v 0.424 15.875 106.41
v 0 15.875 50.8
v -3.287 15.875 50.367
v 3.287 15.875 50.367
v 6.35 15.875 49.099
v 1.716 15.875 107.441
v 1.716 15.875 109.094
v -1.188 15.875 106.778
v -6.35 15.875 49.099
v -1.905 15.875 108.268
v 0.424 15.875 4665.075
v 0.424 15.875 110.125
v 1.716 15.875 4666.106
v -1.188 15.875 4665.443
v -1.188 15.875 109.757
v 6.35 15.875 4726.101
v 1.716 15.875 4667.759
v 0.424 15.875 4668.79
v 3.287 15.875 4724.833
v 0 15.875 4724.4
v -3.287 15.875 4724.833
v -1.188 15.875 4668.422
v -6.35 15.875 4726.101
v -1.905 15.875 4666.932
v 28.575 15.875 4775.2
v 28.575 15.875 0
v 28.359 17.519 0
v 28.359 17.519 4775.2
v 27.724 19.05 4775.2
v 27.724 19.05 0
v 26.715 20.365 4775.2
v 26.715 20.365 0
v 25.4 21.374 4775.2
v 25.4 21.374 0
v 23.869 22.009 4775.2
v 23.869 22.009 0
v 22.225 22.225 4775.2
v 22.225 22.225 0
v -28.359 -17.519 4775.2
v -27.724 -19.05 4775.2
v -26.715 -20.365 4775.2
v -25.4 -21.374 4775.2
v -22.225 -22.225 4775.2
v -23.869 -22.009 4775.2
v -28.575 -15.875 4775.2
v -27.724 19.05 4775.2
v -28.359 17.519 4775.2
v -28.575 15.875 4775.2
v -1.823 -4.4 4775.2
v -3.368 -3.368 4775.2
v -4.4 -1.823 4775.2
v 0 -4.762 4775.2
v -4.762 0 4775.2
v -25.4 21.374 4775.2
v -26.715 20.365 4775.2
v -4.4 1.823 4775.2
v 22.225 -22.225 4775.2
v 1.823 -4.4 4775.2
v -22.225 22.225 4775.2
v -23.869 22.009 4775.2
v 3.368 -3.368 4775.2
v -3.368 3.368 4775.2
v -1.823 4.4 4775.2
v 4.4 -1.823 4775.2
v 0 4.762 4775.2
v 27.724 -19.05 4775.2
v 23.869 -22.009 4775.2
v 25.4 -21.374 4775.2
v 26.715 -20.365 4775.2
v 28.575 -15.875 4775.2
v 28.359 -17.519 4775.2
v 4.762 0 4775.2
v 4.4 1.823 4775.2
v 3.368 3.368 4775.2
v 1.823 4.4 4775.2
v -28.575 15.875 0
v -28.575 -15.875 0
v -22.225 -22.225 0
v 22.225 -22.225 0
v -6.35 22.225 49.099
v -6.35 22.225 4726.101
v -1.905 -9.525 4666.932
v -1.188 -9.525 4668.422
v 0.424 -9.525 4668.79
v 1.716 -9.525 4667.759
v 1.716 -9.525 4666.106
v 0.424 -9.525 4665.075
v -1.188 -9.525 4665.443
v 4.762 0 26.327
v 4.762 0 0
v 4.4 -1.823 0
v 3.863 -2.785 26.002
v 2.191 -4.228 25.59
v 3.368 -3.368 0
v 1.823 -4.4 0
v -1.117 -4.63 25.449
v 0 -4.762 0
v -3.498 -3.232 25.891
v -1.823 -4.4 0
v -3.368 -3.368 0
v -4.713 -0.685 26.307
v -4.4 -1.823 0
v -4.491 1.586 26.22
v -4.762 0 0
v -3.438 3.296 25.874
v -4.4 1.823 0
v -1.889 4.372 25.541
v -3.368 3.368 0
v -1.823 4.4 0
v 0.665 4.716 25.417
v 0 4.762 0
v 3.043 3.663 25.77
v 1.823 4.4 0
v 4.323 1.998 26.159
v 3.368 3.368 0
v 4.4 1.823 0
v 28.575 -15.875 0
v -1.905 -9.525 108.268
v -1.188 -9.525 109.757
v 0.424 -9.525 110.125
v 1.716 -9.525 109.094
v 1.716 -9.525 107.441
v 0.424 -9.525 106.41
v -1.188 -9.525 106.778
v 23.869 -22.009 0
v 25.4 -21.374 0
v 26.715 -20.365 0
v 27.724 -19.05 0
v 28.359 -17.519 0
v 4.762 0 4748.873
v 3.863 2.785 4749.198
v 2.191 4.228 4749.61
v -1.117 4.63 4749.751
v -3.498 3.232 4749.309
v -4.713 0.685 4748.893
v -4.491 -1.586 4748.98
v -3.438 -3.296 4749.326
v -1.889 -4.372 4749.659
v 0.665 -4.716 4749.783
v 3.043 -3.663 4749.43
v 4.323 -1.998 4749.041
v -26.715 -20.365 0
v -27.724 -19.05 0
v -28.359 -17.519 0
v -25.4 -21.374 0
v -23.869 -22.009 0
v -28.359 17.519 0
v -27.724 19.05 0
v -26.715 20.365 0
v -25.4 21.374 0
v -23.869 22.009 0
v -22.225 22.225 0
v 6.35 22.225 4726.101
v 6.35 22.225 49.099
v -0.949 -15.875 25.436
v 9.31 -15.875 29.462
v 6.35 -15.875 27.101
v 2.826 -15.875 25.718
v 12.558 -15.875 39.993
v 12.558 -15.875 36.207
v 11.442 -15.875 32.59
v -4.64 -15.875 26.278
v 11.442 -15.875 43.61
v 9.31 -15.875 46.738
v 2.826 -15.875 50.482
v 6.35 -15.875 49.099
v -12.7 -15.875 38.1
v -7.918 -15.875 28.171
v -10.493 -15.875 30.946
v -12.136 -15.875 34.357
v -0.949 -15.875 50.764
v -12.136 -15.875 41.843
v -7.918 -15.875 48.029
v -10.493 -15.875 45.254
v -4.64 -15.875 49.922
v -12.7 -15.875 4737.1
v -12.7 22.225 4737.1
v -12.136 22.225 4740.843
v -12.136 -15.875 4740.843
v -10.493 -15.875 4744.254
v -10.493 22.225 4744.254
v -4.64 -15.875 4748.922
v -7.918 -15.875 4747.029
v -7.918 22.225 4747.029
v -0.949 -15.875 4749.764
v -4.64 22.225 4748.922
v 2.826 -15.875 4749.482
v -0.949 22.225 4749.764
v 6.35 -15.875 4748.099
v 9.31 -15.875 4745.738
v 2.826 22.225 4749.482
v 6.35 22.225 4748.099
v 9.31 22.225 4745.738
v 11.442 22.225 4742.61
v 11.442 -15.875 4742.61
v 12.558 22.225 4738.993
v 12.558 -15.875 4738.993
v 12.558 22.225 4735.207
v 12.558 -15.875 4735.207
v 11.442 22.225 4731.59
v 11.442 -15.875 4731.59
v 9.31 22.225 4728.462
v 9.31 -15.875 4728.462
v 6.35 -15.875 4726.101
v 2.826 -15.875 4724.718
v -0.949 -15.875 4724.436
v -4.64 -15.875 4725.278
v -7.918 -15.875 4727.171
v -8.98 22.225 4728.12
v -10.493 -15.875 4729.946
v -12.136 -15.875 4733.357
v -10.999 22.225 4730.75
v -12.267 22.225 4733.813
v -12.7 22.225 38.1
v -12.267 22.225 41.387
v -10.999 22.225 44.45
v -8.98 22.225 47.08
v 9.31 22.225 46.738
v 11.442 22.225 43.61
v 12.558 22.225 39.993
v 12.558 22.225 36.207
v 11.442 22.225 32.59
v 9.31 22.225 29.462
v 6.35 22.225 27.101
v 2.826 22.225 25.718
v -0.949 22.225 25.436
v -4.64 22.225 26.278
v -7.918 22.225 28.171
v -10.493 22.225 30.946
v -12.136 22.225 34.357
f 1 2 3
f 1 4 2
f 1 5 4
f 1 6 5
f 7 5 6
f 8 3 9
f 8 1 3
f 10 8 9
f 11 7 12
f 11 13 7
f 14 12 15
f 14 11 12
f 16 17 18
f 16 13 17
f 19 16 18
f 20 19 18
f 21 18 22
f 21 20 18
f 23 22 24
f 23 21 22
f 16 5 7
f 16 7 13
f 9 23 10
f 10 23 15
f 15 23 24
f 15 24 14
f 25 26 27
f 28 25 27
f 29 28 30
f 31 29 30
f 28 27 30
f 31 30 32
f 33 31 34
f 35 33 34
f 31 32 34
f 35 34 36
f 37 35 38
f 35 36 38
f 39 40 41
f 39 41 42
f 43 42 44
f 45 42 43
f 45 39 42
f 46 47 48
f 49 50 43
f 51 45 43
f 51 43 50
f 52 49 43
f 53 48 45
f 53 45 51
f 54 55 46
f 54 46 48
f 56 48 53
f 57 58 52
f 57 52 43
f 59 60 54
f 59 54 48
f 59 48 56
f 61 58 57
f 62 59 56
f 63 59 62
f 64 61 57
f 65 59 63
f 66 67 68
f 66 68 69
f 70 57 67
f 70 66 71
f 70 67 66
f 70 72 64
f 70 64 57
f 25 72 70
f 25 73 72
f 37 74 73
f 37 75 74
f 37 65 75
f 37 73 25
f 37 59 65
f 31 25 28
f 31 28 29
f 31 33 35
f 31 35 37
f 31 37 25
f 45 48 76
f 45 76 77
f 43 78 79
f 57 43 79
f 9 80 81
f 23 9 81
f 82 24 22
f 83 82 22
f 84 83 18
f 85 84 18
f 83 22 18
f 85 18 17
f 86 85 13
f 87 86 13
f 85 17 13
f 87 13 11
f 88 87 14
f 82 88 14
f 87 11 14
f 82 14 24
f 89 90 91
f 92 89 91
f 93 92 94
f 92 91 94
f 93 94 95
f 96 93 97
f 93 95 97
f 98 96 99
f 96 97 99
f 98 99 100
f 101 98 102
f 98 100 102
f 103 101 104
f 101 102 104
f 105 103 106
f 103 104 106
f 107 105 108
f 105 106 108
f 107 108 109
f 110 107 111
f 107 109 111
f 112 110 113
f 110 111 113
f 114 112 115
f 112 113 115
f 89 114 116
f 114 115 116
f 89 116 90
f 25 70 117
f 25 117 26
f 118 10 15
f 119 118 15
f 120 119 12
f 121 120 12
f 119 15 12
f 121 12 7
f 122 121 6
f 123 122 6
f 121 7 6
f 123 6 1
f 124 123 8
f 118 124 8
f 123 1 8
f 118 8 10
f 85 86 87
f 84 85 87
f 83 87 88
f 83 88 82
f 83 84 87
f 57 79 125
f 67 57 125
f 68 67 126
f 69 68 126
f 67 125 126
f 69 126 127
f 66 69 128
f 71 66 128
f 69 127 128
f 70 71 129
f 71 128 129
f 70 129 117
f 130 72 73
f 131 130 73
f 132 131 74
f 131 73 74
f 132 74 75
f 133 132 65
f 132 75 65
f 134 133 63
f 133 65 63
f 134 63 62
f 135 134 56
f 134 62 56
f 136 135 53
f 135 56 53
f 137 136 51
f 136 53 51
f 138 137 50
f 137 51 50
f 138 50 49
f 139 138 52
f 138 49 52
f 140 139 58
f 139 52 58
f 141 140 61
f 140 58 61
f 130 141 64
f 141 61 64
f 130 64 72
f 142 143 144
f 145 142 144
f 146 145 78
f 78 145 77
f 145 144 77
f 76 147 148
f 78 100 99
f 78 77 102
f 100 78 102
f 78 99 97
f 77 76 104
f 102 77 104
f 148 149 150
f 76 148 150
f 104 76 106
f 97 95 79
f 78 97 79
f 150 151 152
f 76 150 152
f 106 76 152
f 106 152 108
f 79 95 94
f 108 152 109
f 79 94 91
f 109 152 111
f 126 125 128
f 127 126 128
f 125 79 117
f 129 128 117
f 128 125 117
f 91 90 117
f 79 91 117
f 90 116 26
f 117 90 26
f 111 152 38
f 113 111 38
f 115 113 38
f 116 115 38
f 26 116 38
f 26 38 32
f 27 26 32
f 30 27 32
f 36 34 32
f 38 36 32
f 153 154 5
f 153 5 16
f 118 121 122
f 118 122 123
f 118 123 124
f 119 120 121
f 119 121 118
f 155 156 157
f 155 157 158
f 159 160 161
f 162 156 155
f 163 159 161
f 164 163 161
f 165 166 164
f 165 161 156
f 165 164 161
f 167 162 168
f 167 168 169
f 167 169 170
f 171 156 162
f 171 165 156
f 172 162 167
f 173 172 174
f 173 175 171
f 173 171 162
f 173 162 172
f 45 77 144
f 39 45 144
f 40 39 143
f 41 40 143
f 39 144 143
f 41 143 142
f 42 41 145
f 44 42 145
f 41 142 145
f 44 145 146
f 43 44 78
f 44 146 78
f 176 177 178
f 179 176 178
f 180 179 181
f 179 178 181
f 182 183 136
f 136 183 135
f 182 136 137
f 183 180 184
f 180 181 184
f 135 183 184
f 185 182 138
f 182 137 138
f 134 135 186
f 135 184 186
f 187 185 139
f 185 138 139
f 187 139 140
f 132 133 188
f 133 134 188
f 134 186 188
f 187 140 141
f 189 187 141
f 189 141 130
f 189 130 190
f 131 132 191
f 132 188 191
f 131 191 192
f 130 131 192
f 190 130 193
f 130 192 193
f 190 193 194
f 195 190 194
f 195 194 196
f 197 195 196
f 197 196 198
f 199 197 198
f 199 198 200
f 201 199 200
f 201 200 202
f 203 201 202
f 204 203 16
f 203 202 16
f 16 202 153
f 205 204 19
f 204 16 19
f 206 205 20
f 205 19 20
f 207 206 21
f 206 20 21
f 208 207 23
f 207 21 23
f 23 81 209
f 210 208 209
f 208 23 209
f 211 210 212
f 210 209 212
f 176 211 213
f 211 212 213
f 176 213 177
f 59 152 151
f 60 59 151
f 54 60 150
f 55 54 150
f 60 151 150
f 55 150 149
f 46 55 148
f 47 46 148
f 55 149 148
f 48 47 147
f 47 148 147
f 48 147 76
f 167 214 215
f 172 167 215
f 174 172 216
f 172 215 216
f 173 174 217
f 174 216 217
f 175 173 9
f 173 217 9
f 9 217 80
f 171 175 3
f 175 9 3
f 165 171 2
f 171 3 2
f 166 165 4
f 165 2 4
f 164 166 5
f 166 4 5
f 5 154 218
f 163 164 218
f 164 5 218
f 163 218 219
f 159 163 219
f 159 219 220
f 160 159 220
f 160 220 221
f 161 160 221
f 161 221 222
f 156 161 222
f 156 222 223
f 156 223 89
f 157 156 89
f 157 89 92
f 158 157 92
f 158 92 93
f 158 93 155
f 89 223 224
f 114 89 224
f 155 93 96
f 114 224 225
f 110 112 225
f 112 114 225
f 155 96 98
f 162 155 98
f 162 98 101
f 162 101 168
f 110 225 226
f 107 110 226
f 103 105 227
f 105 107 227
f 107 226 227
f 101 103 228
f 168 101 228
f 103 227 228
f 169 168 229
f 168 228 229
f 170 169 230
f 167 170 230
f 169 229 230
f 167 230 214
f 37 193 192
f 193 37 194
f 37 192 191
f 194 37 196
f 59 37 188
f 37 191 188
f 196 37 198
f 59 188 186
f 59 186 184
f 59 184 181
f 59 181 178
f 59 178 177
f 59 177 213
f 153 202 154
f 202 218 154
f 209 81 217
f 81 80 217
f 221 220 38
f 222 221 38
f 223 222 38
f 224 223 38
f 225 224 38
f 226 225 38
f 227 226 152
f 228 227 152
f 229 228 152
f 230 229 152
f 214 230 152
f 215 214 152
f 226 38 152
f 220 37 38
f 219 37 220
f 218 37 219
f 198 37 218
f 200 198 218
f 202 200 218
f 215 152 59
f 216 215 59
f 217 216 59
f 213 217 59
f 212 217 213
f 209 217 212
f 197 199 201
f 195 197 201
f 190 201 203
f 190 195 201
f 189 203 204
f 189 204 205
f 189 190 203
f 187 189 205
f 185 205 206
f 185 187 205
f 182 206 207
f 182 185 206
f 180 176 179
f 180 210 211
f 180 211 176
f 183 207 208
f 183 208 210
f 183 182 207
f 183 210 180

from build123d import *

# Parameters (mm, degrees)
F1_DEPTH  = 4775.2
F2_R      = 12.7
F3_DEPTH  = 38.1
F4_W      = 12.7
F4_H      = 4699
F5_DEPTH  = 6.35
F6_R      = 4.7625
F7_DEPTH  = 38.1
F8_R      = 4.7625
F9_DEPTH  = 38.1
F10_R     = 1.905
F11_DEPTH = 25.4


with BuildPart() as f1:
    # F0 (on Top) → F1 (new body)
    with BuildSketch(Plane.XY):
        with BuildLine():
            Line((-22.225, -22.225), (22.225, -22.225))
            ThreePointArc((22.225, -22.225), (26.7151280605, -20.3651280605), (28.575, -15.875))
            Line((28.575, -15.875), (28.575, 15.875))
            ThreePointArc((28.575, 15.875), (26.7151280605, 20.3651280605), (22.225, 22.225))
            Line((22.225, 22.225), (-22.225, 22.225))
            ThreePointArc((-22.225, 22.225), (-26.7151280605, 20.3651280605), (-28.575, 15.875))
            Line((-28.575, 15.875), (-28.575, -15.875))
            ThreePointArc((-28.575, -15.875), (-26.7151280605, -20.3651280605), (-22.225, -22.225))
        make_face()
    extrude(amount=F1_DEPTH)

    # F2 (on face) → F3 (cut)
    with BuildSketch(Plane(origin=(0, 22.225, 0), x_dir=(-1, 0, 0), z_dir=(0, 1, 0))):
        with Locations((0, 38.1)):
            Circle(F2_R)
        with Locations((0, 4737.1)):
            Circle(F2_R)
    extrude(amount=-F3_DEPTH, mode=Mode.SUBTRACT)

    # F4 (on face) → F5 (cut)
    with BuildSketch(Plane(origin=(0, 22.225, 0), x_dir=(-1, 0, 0), z_dir=(0, 1, 0))):
        with Locations((0, 2387.6)):
            Rectangle(F4_W, F4_H)
    extrude(amount=-F5_DEPTH, mode=Mode.SUBTRACT)

    # F6 (on face) → F7 (cut)
    with BuildSketch(Plane.XY.offset(4775.2)):
        Circle(F6_R)
    extrude(amount=-F7_DEPTH, mode=Mode.SUBTRACT)

    # F8 (on face) → F9 (cut)
    with BuildSketch(Plane(origin=(0, 0, 0), x_dir=(1, 0, 0), z_dir=(0, 0, -1))):
        Circle(F8_R)
    extrude(amount=-F9_DEPTH, mode=Mode.SUBTRACT)

    # F10 (on face) → F11 (cut)
    with BuildSketch(Plane(origin=(0, 15.875, 0), x_dir=(-1, 0, 0), z_dir=(0, 1, 0))):
        with Locations((0, 4666.9325)):
            Circle(F10_R)
        with Locations((0, 108.2675)):
            Circle(F10_R)
    extrude(amount=-F11_DEPTH, mode=Mode.SUBTRACT)


solid = f1.part
